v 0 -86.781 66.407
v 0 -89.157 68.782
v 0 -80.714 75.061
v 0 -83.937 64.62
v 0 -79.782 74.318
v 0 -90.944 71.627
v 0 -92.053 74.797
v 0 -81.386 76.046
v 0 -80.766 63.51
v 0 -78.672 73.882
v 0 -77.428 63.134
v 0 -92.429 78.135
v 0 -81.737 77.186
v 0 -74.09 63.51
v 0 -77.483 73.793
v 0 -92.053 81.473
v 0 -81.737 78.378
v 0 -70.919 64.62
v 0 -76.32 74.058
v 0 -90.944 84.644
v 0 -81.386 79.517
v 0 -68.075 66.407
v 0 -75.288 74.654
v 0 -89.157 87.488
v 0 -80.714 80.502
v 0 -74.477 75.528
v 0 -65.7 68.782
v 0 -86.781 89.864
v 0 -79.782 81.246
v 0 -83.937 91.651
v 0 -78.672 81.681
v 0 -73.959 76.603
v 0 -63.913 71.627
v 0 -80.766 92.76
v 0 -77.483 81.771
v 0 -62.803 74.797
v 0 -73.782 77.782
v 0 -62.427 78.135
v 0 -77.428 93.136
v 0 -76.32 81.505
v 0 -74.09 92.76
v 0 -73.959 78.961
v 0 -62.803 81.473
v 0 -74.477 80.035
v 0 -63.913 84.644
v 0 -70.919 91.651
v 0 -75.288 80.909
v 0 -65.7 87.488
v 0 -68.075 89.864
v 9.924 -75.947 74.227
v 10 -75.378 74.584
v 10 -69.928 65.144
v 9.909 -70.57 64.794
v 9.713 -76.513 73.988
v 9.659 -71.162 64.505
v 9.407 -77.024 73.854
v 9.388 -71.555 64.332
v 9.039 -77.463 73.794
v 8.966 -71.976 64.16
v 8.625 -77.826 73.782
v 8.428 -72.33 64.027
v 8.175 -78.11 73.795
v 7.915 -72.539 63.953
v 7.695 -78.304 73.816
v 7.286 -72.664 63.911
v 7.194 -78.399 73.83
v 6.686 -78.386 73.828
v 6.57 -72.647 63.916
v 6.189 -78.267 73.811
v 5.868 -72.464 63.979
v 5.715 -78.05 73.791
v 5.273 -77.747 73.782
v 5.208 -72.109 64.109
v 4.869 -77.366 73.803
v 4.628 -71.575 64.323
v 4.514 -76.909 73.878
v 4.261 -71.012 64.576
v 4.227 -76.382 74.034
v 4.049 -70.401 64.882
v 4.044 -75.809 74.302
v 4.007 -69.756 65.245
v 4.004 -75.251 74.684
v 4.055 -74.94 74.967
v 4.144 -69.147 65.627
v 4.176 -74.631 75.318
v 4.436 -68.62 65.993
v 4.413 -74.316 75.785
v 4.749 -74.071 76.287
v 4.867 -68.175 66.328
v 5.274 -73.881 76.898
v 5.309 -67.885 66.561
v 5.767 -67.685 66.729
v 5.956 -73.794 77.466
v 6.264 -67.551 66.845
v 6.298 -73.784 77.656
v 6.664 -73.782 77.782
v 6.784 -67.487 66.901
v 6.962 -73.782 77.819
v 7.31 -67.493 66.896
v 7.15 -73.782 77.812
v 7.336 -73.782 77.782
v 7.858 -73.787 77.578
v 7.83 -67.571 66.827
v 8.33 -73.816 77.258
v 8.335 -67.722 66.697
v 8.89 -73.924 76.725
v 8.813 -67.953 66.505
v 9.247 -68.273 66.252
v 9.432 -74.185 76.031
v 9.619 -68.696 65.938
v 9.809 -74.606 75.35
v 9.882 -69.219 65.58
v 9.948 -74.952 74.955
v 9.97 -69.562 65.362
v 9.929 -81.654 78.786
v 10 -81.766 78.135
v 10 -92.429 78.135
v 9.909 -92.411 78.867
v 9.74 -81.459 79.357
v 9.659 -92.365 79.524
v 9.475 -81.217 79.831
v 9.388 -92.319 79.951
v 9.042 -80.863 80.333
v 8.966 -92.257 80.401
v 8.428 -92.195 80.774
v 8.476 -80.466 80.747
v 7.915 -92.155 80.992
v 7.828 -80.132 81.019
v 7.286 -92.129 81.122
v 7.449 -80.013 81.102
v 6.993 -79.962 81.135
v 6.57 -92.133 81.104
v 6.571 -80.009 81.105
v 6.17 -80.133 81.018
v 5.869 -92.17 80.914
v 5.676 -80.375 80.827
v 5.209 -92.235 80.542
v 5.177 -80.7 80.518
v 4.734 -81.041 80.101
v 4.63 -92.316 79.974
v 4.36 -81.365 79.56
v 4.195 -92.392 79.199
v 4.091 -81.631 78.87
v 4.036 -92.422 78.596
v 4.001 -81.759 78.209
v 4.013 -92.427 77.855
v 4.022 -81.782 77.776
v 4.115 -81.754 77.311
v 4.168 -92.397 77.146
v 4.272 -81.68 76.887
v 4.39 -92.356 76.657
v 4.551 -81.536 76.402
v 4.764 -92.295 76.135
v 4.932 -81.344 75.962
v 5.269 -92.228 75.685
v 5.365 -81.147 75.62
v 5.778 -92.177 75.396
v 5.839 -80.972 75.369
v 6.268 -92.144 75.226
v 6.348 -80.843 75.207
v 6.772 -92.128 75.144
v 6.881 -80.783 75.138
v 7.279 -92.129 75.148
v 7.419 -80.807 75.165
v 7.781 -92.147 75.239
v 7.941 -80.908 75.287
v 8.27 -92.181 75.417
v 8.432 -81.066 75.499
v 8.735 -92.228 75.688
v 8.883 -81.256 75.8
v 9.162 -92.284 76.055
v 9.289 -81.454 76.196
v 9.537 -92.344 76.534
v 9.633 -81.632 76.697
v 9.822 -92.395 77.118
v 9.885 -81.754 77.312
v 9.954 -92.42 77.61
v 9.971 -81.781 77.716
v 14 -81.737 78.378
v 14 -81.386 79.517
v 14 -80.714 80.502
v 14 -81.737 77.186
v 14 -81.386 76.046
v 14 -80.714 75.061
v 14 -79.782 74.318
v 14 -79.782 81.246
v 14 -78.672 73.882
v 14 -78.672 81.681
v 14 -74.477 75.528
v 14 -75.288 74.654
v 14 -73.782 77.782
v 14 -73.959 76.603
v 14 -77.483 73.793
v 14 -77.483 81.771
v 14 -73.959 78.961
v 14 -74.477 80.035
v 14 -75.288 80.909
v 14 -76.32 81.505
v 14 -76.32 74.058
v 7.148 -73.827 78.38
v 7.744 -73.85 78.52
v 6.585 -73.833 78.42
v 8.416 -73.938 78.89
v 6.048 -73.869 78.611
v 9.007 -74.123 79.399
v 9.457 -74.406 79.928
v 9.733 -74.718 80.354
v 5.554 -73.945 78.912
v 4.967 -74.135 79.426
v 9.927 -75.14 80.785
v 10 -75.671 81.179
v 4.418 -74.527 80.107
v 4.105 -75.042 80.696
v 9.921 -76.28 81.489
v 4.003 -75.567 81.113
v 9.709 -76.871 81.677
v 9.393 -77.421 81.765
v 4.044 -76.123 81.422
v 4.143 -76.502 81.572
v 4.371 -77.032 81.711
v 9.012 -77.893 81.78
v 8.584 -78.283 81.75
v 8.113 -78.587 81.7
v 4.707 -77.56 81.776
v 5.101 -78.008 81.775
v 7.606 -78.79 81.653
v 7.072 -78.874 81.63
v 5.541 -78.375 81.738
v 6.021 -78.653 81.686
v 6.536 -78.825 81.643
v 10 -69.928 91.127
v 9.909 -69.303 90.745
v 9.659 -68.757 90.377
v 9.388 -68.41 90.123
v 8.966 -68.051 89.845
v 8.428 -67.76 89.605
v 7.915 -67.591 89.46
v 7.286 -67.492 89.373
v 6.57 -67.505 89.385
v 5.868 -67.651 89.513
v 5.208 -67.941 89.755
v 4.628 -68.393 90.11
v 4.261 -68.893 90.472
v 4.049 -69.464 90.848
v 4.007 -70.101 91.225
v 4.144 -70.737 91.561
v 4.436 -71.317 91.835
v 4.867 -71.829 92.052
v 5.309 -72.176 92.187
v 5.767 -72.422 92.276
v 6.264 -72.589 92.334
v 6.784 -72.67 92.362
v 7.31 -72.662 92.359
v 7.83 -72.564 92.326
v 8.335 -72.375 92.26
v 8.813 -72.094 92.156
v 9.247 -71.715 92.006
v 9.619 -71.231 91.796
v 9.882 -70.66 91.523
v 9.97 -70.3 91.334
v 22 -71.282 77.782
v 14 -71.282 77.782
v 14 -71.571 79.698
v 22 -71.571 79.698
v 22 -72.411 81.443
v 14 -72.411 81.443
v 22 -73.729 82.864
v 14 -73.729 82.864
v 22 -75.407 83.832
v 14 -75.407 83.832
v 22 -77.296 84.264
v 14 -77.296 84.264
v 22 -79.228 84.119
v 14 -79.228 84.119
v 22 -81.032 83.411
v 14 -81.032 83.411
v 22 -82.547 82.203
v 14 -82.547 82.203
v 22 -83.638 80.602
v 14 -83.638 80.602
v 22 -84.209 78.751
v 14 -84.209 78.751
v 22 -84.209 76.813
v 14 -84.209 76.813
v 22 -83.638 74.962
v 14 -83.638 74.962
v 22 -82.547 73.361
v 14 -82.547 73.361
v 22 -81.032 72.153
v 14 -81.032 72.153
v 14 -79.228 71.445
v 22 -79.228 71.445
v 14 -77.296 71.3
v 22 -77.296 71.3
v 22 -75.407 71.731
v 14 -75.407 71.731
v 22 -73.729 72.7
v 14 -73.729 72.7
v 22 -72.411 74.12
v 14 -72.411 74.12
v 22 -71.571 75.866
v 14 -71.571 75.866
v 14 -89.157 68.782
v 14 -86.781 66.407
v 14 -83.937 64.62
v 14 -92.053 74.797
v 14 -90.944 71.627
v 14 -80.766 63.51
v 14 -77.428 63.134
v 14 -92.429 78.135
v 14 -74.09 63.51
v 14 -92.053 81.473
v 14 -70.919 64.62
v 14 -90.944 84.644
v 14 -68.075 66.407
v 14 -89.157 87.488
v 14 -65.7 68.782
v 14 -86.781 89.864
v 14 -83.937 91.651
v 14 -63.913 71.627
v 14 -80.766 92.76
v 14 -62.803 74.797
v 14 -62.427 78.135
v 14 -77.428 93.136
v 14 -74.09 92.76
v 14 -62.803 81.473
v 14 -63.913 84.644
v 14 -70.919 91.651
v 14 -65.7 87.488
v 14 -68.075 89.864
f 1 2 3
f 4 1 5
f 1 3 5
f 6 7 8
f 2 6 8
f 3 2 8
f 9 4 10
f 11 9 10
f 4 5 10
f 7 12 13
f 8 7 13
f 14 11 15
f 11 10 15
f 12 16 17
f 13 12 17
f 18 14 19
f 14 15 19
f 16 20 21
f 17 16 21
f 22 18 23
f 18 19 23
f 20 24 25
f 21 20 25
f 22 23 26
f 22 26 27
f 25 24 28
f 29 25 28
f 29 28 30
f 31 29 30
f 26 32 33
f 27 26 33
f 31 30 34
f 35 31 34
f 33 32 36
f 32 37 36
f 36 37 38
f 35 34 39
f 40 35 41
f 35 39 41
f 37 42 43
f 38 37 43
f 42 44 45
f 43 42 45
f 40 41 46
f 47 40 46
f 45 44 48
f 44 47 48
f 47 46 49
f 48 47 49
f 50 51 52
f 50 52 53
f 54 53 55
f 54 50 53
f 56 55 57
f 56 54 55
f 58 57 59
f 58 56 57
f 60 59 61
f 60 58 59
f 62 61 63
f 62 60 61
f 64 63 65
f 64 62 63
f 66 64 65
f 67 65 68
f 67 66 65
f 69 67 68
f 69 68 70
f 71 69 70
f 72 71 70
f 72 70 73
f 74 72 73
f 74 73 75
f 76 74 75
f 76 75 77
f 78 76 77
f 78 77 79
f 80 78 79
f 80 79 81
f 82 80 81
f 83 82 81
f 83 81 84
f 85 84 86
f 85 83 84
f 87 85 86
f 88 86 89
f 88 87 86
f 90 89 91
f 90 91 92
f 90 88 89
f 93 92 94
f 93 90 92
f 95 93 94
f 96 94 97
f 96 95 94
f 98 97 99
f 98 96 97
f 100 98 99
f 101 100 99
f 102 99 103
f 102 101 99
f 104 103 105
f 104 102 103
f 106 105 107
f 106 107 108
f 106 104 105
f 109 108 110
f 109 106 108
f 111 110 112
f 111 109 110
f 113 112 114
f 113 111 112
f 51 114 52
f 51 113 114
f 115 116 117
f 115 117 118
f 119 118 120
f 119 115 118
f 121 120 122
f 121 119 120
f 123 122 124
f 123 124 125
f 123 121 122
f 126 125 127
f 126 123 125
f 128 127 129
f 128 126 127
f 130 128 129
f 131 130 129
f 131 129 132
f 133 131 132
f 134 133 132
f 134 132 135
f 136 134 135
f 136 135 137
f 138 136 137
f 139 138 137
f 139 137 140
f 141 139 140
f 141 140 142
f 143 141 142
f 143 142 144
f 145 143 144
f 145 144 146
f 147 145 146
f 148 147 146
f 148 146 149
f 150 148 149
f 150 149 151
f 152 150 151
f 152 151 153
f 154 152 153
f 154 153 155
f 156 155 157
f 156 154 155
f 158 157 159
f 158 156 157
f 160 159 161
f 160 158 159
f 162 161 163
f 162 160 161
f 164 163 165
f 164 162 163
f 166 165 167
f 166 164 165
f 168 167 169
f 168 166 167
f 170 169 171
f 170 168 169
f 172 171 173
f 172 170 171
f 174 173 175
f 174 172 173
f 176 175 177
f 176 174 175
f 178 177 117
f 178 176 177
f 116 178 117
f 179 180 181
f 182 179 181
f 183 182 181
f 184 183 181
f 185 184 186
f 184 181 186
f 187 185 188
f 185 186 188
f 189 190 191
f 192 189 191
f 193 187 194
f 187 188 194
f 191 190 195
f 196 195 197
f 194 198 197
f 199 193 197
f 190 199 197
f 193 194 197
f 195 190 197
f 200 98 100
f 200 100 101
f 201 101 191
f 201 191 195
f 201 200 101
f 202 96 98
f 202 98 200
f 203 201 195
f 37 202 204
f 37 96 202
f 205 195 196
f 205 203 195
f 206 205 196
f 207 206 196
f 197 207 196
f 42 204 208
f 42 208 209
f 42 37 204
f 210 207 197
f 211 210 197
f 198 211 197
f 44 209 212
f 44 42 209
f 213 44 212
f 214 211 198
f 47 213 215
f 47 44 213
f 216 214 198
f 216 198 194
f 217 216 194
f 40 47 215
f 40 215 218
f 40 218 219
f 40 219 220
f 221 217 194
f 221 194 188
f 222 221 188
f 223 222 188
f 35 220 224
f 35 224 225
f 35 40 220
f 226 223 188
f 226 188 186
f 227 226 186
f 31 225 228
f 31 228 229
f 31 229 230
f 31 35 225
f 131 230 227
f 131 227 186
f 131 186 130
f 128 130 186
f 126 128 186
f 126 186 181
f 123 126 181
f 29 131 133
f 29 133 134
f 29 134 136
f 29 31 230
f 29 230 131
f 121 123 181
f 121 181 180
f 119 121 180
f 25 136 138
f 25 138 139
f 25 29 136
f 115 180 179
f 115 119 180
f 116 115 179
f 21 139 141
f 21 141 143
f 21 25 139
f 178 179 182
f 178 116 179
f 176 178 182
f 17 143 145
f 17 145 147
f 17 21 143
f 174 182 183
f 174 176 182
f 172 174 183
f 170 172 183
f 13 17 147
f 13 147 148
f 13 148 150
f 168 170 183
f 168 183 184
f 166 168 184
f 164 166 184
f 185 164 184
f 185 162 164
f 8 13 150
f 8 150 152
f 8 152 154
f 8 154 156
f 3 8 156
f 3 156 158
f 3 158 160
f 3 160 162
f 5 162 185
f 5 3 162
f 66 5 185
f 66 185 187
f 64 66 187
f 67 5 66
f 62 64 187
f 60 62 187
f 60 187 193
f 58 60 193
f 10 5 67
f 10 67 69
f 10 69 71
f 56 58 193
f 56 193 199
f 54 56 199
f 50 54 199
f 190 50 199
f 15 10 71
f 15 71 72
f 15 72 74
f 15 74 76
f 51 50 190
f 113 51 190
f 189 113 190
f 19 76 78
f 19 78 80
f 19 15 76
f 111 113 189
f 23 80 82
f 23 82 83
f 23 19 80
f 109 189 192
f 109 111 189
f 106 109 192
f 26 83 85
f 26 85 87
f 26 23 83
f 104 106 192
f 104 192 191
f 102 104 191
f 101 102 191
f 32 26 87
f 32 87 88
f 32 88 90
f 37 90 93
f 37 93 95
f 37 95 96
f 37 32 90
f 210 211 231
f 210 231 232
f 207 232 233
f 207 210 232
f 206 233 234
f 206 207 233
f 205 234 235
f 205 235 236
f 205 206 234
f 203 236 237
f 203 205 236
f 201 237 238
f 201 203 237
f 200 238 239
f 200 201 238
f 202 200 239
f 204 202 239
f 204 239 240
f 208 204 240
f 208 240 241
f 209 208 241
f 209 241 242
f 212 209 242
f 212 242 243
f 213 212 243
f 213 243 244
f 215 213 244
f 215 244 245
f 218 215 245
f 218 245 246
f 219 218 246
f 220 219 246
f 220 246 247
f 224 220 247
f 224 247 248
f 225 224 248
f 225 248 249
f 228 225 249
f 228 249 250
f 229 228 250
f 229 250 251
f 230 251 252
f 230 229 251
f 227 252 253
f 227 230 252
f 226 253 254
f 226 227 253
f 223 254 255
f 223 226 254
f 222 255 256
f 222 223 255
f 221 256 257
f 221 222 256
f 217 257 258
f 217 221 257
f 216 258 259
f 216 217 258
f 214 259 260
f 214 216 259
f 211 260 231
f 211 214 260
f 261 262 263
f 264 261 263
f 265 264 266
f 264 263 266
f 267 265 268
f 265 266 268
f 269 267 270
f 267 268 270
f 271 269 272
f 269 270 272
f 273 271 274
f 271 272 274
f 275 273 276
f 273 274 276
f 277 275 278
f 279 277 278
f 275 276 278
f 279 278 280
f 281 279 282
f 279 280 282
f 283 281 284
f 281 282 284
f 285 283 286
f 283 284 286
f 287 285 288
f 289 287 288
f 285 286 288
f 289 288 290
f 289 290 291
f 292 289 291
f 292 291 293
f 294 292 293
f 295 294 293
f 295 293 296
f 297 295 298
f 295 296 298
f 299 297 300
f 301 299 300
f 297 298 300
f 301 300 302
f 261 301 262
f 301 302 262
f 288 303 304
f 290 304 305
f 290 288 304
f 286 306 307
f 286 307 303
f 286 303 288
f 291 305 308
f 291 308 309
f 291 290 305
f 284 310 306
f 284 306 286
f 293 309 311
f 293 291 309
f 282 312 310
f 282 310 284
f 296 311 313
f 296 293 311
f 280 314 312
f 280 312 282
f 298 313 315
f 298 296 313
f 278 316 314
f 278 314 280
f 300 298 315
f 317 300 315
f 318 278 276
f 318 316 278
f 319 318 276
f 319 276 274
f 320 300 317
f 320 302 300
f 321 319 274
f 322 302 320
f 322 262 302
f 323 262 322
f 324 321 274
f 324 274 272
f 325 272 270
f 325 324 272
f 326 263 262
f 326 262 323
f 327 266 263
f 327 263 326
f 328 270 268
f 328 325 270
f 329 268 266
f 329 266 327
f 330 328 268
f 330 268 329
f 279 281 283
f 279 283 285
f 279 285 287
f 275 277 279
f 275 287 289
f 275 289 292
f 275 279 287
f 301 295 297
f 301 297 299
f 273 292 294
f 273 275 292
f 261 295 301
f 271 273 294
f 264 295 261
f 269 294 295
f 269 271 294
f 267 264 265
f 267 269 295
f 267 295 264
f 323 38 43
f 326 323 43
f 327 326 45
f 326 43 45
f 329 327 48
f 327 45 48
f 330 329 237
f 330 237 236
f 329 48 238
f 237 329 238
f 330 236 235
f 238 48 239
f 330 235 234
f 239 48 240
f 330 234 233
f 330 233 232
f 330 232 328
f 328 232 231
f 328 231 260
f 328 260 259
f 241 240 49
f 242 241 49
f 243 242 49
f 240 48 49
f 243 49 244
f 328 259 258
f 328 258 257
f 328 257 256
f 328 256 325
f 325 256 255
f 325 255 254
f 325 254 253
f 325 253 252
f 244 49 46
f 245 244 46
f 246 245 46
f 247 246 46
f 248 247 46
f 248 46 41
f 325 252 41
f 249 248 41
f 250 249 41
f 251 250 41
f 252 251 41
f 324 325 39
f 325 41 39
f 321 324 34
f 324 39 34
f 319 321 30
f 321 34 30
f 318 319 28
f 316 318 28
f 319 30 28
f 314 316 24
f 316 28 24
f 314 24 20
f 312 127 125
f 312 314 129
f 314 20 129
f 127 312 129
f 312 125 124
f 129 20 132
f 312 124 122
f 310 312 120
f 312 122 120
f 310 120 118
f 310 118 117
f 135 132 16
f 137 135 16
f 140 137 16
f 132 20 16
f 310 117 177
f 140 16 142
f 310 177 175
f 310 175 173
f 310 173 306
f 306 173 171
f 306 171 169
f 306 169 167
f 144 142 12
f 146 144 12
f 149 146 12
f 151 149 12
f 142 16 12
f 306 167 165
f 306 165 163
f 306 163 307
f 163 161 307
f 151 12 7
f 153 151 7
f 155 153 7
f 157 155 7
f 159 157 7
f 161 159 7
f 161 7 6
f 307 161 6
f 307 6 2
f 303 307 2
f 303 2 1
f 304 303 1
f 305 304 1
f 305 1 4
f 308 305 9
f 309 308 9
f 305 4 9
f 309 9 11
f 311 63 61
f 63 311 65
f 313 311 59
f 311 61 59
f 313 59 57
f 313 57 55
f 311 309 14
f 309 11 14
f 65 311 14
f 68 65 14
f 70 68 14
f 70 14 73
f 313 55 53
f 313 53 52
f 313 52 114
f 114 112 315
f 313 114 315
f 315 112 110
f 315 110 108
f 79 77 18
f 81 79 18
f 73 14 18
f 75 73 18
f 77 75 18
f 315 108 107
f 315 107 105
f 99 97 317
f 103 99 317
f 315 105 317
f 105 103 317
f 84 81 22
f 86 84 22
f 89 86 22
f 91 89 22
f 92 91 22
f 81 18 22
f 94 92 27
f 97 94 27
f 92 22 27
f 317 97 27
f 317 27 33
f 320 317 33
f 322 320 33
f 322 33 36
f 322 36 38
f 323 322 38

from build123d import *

# Parameters (mm, degrees)
F0_R     = 15.001136
F0_R_2   = 4
F1_DEPTH = 14
F3_R     = 3
F4_DEPTH = 25
F5_COUNT = 3
F7_R     = 6.5
F8_DEPTH = 8


with BuildPart() as f1:
    # F0 (on Right) → F1 (new body)
    with BuildSketch(Plane.YZ):
        with Locations((-77.428193, 78.135299)):
            Circle(F0_R)
        with Locations((-77.781746, 77.781746)):
            Circle(F0_R_2, mode=Mode.SUBTRACT)
    extrude(amount=F1_DEPTH)


with BuildPart() as f4:
    # F3 (on face) → F4 (new body)
    with BuildSketch(Plane.XZ.offset(77.428193)):
        with Locations((7, 78.135299)):
            Circle(F3_R)
    extrude(amount=F4_DEPTH)


with BuildPart() as f5_1:
    # F5: instance of F4
    add(f4.part.rotate(Axis((0, -77.428193, 78.135299), (1, 0, 0)), 1 * 360 / F5_COUNT))


with BuildPart() as f5_2:
    # F5: instance of F4
    add(f4.part.rotate(Axis((0, -77.428193, 78.135299), (1, 0, 0)), 2 * 360 / F5_COUNT))


with BuildPart() as f1_1:
    add(f1.part)

    # F6: cut F4, F5_1, F5_2
    add(f4.part, mode=Mode.SUBTRACT)
    add(f5_1.part, mode=Mode.SUBTRACT)
    add(f5_2.part, mode=Mode.SUBTRACT)

    # F7 (on face) → F8 (join)
    with BuildSketch(Plane.YZ.offset(14)):
        with Locations((-77.781746, 77.781746)):
            Circle(F7_R)
    extrude(amount=F8_DEPTH)


solid = f1_1.part
